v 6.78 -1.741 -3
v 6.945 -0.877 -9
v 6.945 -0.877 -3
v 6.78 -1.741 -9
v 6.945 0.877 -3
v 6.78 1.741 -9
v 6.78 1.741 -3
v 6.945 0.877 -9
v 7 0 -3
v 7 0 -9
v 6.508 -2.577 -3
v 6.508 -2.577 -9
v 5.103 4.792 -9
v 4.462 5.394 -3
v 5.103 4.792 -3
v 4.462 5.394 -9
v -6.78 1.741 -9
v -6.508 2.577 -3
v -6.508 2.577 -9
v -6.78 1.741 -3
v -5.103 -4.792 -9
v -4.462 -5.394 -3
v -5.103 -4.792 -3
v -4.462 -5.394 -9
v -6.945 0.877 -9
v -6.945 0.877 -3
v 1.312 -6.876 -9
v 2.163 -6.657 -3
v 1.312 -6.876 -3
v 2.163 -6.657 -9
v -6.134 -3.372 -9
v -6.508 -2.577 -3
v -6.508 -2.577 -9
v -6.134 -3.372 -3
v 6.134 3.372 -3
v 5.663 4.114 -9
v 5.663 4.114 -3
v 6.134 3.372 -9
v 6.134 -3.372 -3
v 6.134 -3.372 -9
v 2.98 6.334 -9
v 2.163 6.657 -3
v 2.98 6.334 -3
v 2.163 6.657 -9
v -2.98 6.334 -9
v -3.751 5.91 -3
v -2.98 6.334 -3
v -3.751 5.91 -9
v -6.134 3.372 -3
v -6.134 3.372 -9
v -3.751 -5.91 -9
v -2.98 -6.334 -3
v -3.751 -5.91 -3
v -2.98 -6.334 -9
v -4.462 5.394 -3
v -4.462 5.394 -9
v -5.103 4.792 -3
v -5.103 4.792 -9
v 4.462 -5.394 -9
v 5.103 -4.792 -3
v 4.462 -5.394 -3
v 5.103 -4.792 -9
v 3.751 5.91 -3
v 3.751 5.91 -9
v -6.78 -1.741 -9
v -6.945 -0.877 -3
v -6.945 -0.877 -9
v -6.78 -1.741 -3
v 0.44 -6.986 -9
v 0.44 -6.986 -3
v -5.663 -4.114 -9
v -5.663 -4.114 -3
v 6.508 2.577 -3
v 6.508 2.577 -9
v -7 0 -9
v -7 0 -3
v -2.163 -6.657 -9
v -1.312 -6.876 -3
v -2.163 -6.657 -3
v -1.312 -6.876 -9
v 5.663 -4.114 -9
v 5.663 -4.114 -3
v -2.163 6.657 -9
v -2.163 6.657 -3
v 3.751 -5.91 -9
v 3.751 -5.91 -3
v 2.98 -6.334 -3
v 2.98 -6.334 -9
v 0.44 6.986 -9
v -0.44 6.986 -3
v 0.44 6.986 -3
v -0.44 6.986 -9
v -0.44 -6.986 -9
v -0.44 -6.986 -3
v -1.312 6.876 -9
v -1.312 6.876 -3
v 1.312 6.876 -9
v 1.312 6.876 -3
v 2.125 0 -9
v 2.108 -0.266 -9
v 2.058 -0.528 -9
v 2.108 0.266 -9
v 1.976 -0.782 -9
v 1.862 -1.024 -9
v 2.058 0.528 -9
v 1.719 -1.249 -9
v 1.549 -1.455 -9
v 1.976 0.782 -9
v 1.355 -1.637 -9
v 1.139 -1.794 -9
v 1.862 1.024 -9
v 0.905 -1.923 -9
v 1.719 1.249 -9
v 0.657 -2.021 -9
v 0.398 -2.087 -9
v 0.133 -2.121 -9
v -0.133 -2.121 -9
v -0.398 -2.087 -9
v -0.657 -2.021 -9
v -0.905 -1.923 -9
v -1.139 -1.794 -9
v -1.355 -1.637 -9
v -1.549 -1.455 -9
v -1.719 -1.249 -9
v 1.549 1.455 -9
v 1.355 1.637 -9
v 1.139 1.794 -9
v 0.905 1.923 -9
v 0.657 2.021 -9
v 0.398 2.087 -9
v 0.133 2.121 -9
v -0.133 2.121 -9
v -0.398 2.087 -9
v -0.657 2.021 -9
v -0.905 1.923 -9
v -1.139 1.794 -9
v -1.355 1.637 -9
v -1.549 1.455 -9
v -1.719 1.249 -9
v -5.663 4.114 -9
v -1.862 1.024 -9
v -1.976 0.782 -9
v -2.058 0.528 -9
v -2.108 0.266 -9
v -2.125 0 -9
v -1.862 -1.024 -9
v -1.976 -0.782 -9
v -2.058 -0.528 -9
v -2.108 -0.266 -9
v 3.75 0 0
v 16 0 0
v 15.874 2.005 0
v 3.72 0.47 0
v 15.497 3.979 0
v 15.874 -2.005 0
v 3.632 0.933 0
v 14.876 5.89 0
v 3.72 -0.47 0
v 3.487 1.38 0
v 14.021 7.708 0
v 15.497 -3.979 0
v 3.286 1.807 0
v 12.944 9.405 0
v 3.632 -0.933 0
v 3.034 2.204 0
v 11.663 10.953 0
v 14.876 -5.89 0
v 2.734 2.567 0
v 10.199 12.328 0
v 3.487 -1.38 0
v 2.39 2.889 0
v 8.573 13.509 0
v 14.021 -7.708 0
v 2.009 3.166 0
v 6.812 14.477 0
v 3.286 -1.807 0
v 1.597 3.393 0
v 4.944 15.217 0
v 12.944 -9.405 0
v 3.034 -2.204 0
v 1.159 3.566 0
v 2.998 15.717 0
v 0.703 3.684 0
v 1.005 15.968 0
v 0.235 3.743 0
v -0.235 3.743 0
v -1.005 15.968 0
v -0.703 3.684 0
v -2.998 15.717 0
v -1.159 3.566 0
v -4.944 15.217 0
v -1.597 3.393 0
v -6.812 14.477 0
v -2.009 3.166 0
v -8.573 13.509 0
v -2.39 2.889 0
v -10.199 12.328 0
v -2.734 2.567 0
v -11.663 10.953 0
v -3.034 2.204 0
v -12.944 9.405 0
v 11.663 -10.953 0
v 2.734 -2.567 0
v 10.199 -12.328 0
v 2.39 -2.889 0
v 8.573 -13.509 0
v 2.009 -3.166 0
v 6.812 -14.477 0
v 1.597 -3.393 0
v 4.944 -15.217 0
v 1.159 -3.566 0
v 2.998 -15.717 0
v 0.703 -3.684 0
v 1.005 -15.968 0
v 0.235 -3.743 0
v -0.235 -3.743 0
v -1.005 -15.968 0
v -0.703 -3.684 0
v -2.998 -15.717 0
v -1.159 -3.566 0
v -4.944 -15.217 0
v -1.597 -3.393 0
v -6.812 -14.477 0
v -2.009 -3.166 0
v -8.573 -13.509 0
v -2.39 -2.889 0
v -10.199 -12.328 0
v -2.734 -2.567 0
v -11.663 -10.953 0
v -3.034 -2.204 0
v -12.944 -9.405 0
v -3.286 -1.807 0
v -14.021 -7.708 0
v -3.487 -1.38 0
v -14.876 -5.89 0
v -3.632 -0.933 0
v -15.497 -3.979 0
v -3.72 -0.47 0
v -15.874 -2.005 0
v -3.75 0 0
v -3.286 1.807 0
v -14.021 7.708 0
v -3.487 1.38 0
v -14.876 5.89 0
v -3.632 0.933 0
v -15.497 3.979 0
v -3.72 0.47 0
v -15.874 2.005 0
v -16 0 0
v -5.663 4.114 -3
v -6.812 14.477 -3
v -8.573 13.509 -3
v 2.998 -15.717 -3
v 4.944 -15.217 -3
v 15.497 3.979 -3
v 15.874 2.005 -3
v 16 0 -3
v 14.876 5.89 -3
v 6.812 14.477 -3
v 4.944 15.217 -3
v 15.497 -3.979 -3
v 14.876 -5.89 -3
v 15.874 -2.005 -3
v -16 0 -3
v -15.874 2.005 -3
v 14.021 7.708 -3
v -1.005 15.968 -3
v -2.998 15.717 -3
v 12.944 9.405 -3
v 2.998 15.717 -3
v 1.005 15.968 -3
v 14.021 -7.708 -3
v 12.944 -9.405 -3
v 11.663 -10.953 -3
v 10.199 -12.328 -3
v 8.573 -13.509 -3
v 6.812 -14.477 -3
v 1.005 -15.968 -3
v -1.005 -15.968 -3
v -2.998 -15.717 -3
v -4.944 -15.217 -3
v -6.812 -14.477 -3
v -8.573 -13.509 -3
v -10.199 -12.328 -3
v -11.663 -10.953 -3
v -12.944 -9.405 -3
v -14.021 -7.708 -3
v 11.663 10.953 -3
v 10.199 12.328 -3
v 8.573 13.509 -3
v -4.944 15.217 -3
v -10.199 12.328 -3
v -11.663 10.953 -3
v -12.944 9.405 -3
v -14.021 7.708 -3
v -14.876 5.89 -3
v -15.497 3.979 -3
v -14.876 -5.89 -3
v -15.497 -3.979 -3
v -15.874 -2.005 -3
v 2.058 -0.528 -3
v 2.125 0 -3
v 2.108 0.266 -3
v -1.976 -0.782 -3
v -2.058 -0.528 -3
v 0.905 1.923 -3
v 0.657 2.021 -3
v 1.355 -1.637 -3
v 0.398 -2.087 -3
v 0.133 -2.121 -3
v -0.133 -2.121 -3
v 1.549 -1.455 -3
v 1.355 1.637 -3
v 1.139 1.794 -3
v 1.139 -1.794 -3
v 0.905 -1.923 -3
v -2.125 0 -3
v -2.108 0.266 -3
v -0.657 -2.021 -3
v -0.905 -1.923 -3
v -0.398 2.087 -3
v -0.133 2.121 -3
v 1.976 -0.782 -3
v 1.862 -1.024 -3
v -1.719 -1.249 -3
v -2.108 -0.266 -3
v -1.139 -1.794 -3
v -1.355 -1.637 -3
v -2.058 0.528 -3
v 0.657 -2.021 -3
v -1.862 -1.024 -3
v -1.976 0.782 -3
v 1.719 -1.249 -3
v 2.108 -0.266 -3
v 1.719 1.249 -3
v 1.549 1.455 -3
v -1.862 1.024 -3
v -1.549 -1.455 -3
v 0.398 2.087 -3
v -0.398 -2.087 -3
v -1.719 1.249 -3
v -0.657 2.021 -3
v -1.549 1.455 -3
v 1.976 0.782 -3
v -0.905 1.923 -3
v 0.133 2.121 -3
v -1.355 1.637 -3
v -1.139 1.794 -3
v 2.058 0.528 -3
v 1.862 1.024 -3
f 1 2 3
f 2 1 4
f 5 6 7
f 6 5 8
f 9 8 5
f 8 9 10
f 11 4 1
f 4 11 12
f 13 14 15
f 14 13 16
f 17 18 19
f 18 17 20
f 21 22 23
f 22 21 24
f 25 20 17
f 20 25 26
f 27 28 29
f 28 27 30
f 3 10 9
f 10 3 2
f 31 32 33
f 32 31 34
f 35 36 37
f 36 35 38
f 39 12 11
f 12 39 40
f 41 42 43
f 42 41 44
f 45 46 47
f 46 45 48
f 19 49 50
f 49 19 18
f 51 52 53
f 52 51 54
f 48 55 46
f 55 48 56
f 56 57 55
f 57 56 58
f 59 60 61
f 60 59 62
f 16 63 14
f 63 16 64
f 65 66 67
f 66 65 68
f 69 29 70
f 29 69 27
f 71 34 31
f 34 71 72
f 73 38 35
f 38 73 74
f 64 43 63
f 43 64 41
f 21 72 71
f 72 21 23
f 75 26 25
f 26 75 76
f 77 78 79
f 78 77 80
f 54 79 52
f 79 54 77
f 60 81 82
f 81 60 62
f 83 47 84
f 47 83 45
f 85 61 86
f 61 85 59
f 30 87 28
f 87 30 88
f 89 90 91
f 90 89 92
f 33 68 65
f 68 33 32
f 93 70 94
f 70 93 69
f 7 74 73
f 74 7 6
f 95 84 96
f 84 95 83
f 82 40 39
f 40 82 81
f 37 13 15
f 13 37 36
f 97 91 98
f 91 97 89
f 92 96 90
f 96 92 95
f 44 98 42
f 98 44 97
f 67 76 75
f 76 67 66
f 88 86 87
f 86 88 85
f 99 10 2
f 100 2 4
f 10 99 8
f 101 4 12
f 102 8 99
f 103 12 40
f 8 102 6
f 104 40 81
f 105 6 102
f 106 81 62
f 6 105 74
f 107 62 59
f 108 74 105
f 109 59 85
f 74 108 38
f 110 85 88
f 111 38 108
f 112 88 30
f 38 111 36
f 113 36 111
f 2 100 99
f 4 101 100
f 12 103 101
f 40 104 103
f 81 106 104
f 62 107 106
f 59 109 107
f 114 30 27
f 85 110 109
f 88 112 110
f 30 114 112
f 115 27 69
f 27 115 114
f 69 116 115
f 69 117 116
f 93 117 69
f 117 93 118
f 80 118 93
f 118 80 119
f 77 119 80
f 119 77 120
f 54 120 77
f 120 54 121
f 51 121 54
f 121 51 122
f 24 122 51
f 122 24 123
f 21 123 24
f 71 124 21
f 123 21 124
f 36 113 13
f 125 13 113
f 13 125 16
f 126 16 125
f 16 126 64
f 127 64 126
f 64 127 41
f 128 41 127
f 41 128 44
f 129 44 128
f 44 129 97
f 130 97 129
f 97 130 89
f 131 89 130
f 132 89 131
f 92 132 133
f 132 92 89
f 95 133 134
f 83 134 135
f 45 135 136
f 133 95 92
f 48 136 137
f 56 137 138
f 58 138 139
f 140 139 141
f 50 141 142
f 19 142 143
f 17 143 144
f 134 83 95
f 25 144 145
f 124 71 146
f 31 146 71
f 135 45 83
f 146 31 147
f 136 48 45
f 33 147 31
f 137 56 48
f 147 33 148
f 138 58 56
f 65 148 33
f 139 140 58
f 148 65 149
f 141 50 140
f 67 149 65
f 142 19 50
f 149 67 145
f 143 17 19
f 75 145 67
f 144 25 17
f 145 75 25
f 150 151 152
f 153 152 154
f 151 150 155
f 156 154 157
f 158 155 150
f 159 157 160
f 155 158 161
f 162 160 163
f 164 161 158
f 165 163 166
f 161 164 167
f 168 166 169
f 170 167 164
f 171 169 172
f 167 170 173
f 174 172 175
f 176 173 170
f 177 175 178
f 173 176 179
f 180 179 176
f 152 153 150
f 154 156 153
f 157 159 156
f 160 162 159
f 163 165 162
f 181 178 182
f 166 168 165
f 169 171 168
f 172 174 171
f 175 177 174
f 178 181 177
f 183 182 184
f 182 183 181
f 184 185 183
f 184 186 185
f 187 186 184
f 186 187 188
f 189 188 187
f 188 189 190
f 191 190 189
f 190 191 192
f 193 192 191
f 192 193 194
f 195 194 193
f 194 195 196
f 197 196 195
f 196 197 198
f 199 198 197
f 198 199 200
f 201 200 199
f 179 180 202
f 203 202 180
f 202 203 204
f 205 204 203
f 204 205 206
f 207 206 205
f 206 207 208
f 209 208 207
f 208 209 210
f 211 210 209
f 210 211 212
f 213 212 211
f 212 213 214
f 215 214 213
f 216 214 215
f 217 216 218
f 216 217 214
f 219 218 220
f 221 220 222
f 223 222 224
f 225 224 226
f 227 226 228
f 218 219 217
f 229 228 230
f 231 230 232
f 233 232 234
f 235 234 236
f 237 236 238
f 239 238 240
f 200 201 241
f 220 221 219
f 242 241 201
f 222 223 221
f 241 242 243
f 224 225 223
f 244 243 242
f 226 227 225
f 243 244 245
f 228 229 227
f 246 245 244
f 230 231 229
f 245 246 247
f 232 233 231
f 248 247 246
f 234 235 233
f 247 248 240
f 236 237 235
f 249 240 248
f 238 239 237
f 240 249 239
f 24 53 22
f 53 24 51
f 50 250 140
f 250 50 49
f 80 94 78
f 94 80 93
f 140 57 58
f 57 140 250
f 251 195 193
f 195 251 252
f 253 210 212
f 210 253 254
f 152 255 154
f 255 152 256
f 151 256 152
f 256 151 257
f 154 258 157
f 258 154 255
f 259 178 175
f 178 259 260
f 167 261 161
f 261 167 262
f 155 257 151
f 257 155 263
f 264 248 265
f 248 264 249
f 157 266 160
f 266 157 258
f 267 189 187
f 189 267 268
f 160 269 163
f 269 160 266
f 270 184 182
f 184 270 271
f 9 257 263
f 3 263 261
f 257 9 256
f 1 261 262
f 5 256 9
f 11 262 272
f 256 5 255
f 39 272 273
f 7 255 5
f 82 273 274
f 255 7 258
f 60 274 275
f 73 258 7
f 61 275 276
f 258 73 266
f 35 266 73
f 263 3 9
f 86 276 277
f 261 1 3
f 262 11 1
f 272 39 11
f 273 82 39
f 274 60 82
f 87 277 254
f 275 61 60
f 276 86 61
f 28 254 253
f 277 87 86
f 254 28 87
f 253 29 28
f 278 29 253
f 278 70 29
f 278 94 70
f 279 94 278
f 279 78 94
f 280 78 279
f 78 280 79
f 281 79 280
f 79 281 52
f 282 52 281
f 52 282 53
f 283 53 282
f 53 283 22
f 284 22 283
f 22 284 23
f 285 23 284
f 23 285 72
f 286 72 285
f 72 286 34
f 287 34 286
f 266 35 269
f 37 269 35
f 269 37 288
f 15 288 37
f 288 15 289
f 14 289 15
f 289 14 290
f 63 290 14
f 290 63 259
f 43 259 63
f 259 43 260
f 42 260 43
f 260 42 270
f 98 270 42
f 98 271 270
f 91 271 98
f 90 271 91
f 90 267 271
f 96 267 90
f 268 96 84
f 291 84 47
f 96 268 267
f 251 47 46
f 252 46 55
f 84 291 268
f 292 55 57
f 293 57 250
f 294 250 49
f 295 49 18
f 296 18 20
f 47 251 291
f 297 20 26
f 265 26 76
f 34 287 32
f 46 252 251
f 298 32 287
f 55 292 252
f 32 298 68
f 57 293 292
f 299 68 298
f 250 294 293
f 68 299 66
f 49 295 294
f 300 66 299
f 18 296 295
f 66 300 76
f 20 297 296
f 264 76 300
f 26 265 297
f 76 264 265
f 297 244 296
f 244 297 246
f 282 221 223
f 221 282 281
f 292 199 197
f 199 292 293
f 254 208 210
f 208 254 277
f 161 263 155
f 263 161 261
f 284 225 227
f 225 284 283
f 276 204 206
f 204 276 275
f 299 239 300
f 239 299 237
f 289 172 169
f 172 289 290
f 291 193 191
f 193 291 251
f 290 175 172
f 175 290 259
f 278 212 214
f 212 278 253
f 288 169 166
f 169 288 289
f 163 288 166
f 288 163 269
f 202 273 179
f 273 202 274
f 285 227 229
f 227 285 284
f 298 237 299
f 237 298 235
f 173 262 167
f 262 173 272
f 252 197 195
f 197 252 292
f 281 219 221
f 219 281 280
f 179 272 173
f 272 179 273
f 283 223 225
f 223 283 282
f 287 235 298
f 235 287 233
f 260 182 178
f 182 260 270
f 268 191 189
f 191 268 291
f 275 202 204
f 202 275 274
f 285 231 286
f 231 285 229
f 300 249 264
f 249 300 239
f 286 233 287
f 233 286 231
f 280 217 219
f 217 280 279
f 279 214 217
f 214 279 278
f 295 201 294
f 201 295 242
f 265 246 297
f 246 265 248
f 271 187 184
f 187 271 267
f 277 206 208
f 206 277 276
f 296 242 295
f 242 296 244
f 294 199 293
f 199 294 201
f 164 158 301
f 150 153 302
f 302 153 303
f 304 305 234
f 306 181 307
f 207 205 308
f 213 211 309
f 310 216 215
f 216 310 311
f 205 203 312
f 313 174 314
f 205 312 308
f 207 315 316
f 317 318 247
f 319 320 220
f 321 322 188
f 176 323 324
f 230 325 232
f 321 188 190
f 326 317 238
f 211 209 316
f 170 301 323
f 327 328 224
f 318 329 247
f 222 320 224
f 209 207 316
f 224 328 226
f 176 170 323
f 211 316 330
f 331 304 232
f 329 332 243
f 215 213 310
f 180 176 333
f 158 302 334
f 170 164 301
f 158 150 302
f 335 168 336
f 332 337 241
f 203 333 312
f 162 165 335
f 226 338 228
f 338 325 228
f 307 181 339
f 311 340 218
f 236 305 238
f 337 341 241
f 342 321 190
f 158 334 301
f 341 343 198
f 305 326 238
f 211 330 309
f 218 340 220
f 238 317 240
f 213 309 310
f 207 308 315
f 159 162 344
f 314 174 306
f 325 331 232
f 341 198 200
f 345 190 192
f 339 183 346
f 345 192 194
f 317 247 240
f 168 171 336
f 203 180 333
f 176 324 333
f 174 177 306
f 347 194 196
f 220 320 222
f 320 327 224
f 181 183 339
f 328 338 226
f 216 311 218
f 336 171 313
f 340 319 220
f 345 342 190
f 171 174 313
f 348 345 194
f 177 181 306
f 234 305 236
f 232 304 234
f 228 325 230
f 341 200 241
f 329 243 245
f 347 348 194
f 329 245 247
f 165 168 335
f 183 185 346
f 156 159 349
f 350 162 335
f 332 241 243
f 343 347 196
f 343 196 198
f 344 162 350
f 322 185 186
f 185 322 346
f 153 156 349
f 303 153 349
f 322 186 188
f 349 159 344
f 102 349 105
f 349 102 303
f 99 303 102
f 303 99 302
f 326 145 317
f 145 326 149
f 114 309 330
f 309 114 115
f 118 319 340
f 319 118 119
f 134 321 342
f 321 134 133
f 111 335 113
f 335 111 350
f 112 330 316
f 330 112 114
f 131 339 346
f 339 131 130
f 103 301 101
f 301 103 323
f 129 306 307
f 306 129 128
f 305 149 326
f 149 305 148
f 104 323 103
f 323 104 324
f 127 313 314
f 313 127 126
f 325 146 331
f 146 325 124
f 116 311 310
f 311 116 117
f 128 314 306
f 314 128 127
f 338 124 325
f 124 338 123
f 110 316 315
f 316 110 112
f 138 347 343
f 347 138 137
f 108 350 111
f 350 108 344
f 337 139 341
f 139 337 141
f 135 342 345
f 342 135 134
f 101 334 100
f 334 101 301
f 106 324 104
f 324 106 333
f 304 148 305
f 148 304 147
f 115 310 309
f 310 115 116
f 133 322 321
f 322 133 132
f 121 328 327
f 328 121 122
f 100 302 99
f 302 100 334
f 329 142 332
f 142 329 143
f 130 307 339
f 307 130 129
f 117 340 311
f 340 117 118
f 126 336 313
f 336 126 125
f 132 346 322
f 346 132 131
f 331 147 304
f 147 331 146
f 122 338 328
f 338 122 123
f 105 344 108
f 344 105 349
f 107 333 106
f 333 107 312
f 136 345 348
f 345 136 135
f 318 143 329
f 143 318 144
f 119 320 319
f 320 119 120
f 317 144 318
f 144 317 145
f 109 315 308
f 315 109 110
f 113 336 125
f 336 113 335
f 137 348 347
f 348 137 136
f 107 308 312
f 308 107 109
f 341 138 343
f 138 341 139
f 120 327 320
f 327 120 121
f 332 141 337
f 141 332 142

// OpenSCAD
$fn = 50;


difference() {
	union() {
		translate(v = [0, 0, -9.0000000000]) {
			cylinder(h = 9, r = 7.0000000000);
		}
		translate(v = [0, 0, -3.0000000000]) {
			cylinder(h = 3, r = 16.0000000000);
		}
	}
	union() {
		translate(v = [0, 0, 0]) {
			rotate(a = [0, 0, 0]) {
				difference() {
					union() {
						#translate(v = [0, 0, -9.0000000000]) {
							cylinder(h = 9, r = 2.0000000000);
						}
						#translate(v = [0, 0, -3]) {
							cylinder(h = 3, r1 = 2.1250000000, r2 = 3.7500000000);
						}
						#translate(v = [0, 0, -9.0000000000]) {
							cylinder(h = 9, r = 2.1250000000);
						}
						#translate(v = [0, 0, -9.0000000000]) {
							cylinder(h = 9, r = 2.0000000000);
						}
					}
					union();
				}
			}
		}
	}
}
